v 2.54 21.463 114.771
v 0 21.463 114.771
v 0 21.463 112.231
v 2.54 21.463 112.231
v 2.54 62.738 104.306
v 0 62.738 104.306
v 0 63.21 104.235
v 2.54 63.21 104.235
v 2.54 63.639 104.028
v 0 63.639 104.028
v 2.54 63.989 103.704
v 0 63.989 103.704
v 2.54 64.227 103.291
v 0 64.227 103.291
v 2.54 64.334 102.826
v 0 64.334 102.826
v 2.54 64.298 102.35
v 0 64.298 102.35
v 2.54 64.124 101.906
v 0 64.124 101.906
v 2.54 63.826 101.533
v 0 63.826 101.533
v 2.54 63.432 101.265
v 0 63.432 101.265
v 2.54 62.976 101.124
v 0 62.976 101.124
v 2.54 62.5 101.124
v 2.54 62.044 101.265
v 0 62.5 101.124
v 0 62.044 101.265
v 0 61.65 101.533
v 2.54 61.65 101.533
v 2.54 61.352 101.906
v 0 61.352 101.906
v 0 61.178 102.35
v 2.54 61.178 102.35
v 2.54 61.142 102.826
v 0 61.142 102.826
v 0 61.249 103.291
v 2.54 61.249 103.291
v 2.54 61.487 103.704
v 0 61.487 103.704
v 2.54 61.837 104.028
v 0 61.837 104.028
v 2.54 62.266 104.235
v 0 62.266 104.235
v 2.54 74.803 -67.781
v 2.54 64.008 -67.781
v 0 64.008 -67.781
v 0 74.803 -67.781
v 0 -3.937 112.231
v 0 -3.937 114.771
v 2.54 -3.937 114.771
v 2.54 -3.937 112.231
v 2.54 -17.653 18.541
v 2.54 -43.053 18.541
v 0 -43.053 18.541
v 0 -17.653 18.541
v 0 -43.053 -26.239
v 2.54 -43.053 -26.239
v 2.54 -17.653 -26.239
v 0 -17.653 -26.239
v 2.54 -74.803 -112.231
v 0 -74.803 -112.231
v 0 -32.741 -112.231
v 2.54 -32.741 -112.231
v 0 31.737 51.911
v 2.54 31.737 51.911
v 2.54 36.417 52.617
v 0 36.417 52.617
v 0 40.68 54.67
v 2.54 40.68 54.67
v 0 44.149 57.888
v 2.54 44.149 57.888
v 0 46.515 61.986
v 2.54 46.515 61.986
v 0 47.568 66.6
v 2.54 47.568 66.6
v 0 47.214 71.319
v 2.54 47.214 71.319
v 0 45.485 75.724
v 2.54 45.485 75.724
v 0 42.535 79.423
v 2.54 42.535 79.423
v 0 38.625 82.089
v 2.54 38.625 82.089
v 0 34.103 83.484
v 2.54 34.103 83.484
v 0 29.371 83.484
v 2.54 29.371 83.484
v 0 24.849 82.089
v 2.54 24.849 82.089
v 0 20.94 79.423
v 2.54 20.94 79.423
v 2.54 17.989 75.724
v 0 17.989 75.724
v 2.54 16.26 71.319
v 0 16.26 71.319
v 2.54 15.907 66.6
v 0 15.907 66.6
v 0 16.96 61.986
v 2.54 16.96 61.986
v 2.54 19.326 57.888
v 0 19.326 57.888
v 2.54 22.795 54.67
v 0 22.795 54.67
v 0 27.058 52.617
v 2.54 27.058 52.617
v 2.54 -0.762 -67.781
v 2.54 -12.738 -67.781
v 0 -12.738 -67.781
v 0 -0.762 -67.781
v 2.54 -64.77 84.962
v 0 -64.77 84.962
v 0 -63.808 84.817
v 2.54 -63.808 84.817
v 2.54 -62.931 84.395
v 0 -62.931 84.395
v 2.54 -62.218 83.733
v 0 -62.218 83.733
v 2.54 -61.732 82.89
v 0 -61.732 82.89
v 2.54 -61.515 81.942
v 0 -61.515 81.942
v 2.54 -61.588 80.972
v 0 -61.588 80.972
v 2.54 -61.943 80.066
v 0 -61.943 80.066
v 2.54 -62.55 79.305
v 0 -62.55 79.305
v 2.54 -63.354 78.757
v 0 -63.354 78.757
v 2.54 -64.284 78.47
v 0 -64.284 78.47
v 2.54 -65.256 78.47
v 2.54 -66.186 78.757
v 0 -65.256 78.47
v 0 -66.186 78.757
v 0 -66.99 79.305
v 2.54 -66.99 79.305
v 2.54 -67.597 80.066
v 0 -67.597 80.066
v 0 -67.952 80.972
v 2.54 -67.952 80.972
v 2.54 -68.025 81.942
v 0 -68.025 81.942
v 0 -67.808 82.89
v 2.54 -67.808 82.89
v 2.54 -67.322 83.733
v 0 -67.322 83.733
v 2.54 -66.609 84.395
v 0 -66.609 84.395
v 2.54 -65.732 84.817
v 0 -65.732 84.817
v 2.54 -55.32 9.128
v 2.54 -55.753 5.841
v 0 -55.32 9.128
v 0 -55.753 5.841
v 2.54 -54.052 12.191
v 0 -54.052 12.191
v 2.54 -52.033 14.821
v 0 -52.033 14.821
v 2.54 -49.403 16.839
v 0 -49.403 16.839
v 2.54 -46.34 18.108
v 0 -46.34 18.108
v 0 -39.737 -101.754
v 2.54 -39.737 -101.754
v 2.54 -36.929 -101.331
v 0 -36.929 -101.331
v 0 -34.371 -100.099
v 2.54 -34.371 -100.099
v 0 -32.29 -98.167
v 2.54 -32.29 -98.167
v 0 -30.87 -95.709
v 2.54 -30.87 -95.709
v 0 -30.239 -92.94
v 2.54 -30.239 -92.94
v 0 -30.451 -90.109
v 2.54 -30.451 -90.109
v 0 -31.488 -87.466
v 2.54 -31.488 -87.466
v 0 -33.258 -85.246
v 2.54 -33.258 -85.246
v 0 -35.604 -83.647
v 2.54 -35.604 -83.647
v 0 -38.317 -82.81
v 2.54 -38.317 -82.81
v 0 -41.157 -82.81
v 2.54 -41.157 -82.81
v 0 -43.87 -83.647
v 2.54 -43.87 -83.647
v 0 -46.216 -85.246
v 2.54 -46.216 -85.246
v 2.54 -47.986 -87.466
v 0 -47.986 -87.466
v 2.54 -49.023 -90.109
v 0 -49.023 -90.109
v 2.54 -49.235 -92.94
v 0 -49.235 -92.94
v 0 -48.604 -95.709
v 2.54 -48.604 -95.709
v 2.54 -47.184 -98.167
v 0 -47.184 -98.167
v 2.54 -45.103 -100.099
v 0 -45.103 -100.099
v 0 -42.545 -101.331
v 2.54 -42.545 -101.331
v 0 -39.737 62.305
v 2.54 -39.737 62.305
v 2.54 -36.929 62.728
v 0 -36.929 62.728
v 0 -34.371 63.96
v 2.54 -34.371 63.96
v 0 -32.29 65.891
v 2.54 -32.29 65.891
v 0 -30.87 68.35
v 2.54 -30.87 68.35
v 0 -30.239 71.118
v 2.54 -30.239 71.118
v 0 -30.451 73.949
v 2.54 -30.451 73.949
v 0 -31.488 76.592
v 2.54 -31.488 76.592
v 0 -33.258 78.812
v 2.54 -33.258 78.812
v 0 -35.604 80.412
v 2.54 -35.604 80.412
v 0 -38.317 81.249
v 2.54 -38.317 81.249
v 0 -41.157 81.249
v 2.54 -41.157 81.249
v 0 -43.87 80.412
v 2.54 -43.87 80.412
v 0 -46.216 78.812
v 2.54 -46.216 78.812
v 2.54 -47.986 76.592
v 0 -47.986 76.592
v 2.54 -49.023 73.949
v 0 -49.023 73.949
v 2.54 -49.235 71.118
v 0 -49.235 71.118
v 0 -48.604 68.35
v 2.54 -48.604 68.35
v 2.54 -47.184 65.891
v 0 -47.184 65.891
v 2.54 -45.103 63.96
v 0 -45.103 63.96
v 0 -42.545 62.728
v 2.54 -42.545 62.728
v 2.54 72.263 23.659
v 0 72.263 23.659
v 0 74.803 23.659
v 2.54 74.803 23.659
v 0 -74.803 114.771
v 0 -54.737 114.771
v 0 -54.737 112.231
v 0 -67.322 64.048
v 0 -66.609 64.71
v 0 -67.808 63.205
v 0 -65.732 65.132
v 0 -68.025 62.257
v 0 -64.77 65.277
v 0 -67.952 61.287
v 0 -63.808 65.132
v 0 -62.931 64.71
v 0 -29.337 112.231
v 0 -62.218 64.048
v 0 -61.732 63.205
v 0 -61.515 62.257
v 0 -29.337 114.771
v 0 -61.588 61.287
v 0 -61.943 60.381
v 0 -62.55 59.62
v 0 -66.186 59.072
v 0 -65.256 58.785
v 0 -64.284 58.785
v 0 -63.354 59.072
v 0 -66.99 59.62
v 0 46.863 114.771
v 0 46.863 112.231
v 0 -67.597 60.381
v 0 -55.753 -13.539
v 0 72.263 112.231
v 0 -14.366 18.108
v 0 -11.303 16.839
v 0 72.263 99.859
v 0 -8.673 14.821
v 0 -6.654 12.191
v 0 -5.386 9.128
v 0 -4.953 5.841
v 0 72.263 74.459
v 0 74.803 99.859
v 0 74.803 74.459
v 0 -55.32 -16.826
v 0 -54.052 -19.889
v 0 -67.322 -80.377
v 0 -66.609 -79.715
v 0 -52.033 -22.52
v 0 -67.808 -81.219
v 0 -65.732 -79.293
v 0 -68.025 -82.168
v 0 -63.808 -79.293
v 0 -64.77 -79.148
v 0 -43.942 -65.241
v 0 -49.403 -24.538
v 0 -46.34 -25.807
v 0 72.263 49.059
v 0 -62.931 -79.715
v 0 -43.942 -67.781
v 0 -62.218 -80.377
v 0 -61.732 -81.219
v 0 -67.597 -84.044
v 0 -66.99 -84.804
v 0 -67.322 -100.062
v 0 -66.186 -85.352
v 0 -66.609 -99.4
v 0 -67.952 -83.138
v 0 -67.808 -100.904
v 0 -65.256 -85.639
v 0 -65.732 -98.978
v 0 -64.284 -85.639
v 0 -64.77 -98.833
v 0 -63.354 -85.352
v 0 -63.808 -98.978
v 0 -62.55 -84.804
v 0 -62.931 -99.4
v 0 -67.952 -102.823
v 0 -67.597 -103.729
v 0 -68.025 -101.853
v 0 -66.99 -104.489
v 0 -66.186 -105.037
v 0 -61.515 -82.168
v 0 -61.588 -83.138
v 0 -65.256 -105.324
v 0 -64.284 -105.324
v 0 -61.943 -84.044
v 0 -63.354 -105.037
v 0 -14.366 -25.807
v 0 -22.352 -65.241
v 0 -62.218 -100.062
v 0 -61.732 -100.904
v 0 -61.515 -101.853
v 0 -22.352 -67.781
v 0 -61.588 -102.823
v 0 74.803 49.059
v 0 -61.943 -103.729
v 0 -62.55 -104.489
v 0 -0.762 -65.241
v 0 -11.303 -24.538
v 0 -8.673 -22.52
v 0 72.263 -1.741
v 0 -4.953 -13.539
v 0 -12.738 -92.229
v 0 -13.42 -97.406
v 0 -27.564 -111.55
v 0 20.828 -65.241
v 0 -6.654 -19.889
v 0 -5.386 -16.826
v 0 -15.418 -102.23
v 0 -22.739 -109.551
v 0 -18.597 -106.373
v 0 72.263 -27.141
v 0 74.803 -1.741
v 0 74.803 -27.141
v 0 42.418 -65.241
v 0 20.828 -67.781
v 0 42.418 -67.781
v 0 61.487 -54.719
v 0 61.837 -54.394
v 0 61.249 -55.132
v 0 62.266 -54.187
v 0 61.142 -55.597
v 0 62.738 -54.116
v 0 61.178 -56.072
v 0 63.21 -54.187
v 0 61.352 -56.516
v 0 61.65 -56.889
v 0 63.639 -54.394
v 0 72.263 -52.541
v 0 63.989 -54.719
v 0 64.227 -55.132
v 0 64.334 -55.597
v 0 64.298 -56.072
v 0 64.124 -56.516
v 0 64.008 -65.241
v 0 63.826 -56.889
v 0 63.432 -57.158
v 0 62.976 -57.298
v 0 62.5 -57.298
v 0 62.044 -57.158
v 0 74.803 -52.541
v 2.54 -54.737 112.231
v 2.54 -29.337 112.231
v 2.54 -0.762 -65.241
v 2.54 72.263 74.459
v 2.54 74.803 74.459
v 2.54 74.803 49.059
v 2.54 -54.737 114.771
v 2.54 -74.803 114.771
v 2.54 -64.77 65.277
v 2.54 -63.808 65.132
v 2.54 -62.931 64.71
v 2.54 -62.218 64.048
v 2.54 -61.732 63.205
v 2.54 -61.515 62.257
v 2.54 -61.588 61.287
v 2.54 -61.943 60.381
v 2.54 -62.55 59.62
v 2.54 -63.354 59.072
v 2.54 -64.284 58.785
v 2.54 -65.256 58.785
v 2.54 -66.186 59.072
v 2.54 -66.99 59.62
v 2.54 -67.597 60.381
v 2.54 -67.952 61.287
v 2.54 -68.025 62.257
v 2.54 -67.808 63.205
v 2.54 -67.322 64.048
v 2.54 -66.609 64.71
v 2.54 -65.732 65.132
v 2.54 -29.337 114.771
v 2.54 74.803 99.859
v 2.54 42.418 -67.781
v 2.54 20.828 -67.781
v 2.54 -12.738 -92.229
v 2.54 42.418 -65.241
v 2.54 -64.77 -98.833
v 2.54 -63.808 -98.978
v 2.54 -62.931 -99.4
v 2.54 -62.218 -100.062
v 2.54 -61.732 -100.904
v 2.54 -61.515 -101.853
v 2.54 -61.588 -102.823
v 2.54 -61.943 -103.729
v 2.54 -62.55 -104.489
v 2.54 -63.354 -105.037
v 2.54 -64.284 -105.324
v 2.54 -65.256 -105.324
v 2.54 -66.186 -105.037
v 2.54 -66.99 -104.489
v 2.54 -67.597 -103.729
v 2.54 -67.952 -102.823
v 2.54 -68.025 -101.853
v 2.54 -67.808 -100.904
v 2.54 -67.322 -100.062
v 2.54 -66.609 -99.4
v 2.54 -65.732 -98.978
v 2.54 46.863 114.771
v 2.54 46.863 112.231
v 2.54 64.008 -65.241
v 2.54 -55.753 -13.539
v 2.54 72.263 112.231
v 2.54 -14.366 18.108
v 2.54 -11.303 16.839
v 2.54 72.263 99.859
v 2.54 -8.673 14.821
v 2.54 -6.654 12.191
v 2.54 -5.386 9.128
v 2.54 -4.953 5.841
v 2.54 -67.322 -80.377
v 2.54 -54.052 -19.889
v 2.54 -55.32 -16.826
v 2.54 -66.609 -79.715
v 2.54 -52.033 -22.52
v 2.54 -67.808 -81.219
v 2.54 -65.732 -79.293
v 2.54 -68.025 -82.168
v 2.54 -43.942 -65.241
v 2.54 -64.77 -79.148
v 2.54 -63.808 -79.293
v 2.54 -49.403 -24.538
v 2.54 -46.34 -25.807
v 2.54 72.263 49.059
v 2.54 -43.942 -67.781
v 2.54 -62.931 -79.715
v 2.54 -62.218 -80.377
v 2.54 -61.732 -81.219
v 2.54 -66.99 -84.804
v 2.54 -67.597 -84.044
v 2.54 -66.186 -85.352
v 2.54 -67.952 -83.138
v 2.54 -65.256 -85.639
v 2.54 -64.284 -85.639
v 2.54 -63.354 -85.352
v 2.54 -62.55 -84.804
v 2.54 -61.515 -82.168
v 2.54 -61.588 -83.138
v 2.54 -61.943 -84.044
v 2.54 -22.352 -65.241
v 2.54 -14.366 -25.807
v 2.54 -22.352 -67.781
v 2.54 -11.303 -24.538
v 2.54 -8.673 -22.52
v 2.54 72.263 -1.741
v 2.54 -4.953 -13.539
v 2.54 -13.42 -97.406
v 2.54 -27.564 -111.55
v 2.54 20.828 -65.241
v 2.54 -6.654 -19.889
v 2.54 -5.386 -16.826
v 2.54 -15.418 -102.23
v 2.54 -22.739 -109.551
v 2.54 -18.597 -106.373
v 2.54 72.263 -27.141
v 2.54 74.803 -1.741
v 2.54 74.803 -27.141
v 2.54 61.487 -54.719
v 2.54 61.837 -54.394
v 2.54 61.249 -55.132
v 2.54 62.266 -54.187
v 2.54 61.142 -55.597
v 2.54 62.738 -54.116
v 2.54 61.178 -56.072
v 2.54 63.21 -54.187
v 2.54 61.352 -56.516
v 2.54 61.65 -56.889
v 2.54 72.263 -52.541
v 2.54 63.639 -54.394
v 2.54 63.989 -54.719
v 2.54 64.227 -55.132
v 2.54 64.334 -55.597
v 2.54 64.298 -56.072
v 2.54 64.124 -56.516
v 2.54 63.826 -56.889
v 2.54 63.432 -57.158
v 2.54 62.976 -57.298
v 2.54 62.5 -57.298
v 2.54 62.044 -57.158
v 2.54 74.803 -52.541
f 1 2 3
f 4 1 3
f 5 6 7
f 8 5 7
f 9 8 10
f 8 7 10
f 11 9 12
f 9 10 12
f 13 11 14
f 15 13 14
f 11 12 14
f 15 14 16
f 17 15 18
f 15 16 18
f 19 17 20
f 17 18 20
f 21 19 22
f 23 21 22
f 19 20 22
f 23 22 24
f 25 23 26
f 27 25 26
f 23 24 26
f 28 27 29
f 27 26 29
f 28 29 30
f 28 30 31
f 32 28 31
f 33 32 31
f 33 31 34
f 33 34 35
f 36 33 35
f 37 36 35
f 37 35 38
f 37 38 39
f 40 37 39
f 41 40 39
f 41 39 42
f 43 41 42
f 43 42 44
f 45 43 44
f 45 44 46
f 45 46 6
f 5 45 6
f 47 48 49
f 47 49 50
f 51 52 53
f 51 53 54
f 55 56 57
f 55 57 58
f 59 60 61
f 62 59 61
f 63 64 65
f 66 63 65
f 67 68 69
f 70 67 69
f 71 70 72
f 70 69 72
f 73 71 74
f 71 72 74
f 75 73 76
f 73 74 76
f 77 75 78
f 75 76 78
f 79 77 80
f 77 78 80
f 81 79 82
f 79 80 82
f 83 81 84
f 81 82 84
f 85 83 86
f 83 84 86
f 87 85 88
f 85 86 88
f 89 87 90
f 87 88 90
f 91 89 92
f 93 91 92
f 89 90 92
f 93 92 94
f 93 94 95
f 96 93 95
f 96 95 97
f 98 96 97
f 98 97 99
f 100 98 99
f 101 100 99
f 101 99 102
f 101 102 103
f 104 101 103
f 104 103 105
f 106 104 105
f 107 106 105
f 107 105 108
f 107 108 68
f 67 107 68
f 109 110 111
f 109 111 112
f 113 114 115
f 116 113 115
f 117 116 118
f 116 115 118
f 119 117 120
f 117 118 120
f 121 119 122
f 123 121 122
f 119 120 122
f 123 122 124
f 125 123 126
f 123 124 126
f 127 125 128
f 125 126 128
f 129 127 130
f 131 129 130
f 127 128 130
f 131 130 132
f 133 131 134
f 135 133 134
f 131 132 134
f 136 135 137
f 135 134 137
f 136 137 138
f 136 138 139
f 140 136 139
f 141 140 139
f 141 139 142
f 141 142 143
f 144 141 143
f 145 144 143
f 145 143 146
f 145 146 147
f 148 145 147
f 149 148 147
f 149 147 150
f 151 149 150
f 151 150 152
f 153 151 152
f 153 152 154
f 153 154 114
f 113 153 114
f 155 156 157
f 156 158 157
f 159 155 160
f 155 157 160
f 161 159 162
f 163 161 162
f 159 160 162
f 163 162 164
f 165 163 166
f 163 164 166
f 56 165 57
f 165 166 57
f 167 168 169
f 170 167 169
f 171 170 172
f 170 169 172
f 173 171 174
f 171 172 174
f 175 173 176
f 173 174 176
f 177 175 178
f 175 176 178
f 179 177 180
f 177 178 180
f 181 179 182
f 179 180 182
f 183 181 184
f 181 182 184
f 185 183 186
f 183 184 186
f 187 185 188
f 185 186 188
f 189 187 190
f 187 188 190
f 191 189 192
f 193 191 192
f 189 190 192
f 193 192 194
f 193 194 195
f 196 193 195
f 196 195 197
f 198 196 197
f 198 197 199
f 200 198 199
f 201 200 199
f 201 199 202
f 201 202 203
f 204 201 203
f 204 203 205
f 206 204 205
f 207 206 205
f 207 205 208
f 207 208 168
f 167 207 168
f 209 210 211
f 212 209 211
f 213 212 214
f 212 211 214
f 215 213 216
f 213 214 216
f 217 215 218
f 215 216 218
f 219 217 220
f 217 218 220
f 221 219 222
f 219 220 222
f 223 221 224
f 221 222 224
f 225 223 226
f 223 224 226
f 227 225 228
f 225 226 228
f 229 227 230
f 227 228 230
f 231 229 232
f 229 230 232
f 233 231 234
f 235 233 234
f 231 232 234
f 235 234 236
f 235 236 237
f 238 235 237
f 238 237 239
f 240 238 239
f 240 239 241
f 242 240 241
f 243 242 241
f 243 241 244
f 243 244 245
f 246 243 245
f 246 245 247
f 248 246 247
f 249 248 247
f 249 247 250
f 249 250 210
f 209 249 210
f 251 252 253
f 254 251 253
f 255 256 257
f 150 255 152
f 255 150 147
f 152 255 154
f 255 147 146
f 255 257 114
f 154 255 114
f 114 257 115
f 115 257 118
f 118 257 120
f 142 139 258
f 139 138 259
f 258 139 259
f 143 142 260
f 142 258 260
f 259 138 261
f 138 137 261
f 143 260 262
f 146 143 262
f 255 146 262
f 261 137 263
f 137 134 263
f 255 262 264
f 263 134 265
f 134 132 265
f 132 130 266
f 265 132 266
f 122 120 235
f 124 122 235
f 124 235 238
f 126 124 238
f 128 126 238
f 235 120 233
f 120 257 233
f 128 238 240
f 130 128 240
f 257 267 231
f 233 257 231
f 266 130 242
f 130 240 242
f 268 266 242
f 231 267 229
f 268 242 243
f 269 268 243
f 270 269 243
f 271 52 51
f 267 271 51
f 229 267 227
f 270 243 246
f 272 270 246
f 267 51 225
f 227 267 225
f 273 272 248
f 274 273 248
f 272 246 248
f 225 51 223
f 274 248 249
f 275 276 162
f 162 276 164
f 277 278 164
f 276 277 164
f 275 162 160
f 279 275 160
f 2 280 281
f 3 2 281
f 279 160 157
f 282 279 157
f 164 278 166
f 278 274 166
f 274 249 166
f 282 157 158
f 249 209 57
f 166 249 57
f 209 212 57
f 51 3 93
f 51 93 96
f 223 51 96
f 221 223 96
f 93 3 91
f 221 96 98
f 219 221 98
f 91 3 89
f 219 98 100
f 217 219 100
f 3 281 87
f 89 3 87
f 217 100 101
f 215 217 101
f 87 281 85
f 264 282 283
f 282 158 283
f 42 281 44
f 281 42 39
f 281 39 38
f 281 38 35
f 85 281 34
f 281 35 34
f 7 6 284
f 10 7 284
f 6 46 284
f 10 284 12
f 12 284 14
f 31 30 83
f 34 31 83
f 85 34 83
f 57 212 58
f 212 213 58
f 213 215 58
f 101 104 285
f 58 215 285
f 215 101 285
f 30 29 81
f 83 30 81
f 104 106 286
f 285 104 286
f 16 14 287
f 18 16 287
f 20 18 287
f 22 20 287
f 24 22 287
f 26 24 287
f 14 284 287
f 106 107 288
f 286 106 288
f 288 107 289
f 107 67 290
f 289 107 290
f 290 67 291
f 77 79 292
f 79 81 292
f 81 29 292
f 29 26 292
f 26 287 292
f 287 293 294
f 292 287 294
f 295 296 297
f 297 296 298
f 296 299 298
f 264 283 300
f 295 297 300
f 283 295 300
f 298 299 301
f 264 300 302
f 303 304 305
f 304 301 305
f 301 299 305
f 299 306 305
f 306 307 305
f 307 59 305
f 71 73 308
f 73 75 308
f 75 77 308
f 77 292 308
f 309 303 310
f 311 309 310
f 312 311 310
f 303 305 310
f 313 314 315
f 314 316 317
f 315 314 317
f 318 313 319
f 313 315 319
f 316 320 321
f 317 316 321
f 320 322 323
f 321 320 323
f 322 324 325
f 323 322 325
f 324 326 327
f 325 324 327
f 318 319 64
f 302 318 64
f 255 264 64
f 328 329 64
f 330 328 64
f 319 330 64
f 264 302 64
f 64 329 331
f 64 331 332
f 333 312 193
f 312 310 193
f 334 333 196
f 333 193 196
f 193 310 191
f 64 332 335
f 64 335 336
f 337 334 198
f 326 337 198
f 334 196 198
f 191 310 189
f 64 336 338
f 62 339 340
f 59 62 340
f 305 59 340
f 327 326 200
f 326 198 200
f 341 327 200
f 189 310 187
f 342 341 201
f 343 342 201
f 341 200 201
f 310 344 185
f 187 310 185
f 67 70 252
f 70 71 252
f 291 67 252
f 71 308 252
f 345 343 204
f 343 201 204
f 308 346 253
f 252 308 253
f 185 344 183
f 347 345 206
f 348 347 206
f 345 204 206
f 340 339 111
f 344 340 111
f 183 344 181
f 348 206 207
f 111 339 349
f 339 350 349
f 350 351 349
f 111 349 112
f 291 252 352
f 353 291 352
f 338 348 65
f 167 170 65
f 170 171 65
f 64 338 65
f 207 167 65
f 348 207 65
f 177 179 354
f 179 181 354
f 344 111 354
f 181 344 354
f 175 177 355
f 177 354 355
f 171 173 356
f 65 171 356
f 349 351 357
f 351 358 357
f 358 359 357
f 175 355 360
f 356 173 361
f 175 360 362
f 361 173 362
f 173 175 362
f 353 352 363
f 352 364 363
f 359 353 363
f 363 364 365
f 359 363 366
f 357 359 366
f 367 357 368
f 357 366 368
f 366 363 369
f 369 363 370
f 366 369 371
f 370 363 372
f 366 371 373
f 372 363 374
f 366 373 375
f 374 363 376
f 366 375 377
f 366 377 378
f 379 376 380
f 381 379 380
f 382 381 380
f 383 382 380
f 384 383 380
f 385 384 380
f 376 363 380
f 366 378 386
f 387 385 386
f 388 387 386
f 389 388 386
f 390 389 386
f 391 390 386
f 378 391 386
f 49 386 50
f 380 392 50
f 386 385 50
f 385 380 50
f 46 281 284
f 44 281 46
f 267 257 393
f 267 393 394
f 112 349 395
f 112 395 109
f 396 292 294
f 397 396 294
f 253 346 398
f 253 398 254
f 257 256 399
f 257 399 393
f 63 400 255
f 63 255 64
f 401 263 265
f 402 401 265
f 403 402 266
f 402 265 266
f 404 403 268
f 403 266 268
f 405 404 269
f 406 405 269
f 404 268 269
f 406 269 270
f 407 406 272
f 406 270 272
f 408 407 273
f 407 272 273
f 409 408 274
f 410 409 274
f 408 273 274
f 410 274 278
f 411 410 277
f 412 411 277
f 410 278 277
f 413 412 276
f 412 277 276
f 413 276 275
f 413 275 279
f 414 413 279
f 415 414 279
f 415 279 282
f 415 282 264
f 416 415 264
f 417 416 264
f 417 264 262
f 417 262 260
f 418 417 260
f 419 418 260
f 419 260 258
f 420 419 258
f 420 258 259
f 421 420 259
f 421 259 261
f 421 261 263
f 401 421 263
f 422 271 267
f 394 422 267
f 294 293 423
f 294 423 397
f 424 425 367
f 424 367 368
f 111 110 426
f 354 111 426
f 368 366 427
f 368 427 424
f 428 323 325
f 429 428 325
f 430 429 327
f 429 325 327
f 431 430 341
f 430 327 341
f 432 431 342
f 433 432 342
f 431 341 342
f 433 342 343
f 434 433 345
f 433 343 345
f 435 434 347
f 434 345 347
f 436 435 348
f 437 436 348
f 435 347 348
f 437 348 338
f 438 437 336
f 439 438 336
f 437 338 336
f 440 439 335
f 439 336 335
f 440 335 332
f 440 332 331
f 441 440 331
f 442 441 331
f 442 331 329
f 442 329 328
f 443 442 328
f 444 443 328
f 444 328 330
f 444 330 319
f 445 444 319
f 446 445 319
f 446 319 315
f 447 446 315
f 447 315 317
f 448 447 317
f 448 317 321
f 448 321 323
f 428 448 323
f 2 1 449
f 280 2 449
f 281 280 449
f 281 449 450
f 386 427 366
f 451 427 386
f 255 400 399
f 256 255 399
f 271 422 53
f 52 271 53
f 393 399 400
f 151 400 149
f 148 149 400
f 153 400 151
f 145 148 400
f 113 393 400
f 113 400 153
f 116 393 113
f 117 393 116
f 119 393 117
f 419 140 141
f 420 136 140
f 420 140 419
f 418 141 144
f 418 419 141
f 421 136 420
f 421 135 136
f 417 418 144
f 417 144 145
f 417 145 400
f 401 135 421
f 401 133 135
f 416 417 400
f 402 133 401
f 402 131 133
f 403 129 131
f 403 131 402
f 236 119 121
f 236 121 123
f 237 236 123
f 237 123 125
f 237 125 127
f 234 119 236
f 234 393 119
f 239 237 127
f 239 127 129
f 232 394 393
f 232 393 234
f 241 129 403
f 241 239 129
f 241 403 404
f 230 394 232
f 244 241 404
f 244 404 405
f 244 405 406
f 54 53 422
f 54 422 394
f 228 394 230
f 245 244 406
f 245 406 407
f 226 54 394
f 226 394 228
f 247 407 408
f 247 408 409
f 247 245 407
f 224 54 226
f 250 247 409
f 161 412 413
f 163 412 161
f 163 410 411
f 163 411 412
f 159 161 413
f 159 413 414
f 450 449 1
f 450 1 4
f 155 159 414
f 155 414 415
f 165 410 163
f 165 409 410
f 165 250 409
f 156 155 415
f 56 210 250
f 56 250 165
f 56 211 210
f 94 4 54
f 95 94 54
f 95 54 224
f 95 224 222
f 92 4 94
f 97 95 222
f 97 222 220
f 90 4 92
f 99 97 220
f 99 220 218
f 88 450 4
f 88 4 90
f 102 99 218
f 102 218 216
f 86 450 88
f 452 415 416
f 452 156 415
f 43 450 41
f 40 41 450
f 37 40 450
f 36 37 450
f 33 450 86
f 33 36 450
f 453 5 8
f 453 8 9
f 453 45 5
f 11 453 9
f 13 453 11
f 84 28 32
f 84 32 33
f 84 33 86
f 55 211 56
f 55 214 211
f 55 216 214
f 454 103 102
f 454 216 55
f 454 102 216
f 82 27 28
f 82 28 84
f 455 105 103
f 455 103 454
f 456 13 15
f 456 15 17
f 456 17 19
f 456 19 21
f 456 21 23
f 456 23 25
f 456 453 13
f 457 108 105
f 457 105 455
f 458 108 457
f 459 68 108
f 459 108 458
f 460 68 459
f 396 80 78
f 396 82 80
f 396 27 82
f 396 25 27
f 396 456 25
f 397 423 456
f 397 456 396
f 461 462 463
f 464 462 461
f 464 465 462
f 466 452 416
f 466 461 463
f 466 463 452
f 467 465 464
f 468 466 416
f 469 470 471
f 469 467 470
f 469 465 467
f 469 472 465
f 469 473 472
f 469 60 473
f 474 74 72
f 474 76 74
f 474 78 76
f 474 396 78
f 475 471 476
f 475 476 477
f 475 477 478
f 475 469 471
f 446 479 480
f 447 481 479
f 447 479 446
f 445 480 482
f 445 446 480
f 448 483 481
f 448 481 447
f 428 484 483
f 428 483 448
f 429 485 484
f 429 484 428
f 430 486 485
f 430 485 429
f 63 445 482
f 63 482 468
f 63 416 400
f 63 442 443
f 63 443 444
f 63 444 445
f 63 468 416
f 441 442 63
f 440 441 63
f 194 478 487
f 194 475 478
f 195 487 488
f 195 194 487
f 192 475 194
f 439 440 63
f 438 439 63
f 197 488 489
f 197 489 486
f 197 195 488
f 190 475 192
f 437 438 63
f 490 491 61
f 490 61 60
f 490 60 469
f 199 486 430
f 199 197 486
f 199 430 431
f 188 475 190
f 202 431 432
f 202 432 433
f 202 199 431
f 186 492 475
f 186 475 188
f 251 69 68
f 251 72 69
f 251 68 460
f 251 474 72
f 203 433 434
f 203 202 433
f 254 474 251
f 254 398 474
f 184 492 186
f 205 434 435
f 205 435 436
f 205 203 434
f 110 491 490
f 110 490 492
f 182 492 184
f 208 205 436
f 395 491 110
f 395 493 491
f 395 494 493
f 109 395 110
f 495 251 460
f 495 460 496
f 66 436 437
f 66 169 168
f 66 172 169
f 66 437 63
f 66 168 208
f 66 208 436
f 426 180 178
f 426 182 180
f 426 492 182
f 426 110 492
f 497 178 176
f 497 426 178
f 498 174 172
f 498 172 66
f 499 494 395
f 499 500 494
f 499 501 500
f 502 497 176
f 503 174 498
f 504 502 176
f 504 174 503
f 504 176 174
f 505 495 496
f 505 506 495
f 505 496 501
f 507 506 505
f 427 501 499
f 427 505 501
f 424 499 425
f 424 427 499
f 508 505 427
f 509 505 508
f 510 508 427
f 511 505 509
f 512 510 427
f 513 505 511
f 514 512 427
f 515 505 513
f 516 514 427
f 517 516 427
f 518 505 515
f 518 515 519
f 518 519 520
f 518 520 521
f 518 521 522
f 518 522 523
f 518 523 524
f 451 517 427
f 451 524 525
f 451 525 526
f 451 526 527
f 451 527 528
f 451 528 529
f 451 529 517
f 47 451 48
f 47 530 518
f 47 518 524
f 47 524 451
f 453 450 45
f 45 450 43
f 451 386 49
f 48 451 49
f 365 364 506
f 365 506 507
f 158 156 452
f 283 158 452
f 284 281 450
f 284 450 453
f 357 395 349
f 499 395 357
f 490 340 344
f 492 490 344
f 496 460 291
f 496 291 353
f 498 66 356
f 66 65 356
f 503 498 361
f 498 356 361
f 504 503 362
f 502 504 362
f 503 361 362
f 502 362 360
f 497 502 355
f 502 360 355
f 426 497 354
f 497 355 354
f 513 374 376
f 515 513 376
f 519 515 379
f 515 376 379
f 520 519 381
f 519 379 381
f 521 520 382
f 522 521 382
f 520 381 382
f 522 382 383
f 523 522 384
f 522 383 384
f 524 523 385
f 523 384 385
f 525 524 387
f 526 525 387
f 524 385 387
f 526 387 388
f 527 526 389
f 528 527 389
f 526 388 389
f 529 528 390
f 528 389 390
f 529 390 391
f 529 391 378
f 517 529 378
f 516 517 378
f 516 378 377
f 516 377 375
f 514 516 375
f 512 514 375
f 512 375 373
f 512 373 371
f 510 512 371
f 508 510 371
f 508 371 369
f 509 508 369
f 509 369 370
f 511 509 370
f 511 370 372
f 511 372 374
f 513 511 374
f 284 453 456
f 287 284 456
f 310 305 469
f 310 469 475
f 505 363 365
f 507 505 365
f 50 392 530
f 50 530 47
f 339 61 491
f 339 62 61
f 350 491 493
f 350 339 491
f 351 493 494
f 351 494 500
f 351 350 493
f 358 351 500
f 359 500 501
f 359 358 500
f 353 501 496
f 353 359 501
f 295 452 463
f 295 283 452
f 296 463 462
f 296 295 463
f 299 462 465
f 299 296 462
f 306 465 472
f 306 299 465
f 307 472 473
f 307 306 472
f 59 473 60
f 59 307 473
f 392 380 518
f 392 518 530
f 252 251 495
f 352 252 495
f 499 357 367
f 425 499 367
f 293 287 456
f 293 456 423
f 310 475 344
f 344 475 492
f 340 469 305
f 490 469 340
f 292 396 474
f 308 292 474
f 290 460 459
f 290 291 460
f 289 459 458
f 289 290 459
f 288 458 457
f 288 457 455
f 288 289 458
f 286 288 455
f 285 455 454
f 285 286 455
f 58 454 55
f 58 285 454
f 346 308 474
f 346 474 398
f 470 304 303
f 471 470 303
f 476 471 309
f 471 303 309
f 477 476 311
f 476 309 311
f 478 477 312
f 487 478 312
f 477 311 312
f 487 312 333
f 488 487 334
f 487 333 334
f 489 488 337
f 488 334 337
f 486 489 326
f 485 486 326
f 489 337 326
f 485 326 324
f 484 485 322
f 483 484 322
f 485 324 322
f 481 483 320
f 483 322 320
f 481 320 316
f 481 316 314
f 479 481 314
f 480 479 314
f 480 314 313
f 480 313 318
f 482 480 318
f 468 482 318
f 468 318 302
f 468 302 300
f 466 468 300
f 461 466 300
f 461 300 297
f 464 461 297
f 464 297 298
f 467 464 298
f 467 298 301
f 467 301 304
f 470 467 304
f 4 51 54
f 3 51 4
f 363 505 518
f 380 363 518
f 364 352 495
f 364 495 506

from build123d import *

# Parameters (mm, degrees)
SKETCH1_W                   = 224.46234
SKETCH1_H                   = 149.606
BOSS_EXTRUDE1_DEPTH         = 2.54
SKETCH2_W                   = 44.45
SKETCH2_H                   = 87.5411
CUT_EXTRUDE1_DEPTH          = 135.899132423
FILLET1_R                   = 20.0025
F_1_4_CLEARANCE_HOLE1_D     = 6.5278
F_1_4_CLEARANCE_HOLE1_DEPTH = 9.398
F_1_4_CLEARANCE_HOLE1_TIP   = 1.961148974
SKETCH6_W                   = 25.4
SKETCH6_H                   = 2.54
CUT_EXTRUDE2_DEPTH          = 135.899132423
LPATTERN1_COUNT             = 4
LPATTERN1_PITCH             = 50.8
SKETCH7_W                   = 2.54
SKETCH7_H                   = 21.59
CUT_EXTRUDE3_DEPTH          = 135.899132423
LPATTERN2_COUNT             = 3
LPATTERN2_PITCH             = 43.18
SKETCH8_R                   = 9.525
CUT_EXTRUDE4_DEPTH          = 135.899132423
SKETCH9_R                   = 15.875
SKETCH9_W                   = 44.7802
SKETCH9_H                   = 50.8
CUT_EXTRUDE5_DEPTH          = 135.899132423
FILLET2_R                   = 12.7
M3_CLEARANCE_HOLE1_D        = 3.2
M3_CLEARANCE_HOLE1_DEPTH    = 9.398
M3_CLEARANCE_HOLE1_TIP      = 0.96137699
SKETCH16_W                  = 2.54
SKETCH16_H                  = 25.4
BOSS_EXTRUDE2_DEPTH         = 2.54
LPATTERN3_COUNT             = 3
LPATTERN3_PITCH             = 50.8
SKETCH18_W                  = 2.54
SKETCH18_H                  = 5.334
CUT_EXTRUDE7_DEPTH          = 141.002899371


with BuildPart() as part:
    # Sketch1 → Boss-Extrude1 (new body)
    with BuildSketch(Plane(origin=(0, 0, 0), x_dir=(0, 0, -1), z_dir=(1, 0, 0))):
        Rectangle(SKETCH1_W, SKETCH1_H)
    extrude(amount=BOSS_EXTRUDE1_DEPTH)

    # Sketch2 → Cut-Extrude1 (cut, through all)
    with BuildSketch(Plane(origin=(2.54, 0, 0), x_dir=(0, 0, -1), z_dir=(1, 0, 0))):
        with Locations((90.00617, 31.03245)):
            Rectangle(SKETCH2_W, SKETCH2_H)
    extrude(amount=-CUT_EXTRUDE1_DEPTH, mode=Mode.SUBTRACT)

    # Fillet1
    fillet1_edges = [part.edges().sort_by_distance(p)[0] for p in [
        (1.27, -12.7381, -112.23117),
    ]]
    fillet(fillet1_edges, radius=FILLET1_R)

    # 1/4 Clearance Hole1
    with Locations(Plane(origin=(2.54, 0, 0), x_dir=(0, 0, -1), z_dir=(1, 0, 0))):
        with Locations((-81.69783, -64.77), (-62.01283, -64.77), (102.09657, -64.77), (82.41157, -64.77)):
            Hole(F_1_4_CLEARANCE_HOLE1_D / 2, depth=F_1_4_CLEARANCE_HOLE1_DEPTH)
            with Locations((0, 0, -(F_1_4_CLEARANCE_HOLE1_DEPTH + F_1_4_CLEARANCE_HOLE1_TIP / 2))):  # 118° drill point
                Cone(0, F_1_4_CLEARANCE_HOLE1_D / 2, F_1_4_CLEARANCE_HOLE1_TIP, mode=Mode.SUBTRACT)

    # Sketch6 → Cut-Extrude2 (cut, through all)
    with BuildSketch(Plane(origin=(2.54, 0, 0), x_dir=(0, 0, -1), z_dir=(1, 0, 0))):
        with Locations((39.84117, 73.533)):
            Rectangle(SKETCH6_W, SKETCH6_H)
    cut_extrude2 = extrude(amount=-CUT_EXTRUDE2_DEPTH, mode=Mode.SUBTRACT)

    # LPattern1: Cut-Extrude2 ×4
    with Locations(*[(0, 0, i * LPATTERN1_PITCH) for i in range(1, LPATTERN1_COUNT)]):
        add(cut_extrude2, mode=Mode.SUBTRACT)

    # Sketch7 → Cut-Extrude3 (cut, through all)
    with BuildSketch(Plane(origin=(2.54, 0, 0), x_dir=(0, 0, -1), z_dir=(1, 0, 0))):
        with Locations((66.51117, 53.213)):
            Rectangle(SKETCH7_W, SKETCH7_H)
    cut_extrude3 = extrude(amount=-CUT_EXTRUDE3_DEPTH, mode=Mode.SUBTRACT)

    # LPattern2: Cut-Extrude3 ×3
    with Locations(*[(0, -i * LPATTERN2_PITCH, 0) for i in range(1, LPATTERN2_COUNT)]):
        add(cut_extrude3, mode=Mode.SUBTRACT)

    # Sketch8 → Cut-Extrude4 (cut, through all)
    with BuildSketch(Plane(origin=(2.54, 0, 0), x_dir=(0, 0, -1), z_dir=(1, 0, 0))):
        with Locations((92.22867, -39.7370046)):
            Circle(SKETCH8_R)
        with Locations((-71.82993, -39.7370046)):
            Circle(SKETCH8_R)
    extrude(amount=-CUT_EXTRUDE4_DEPTH, mode=Mode.SUBTRACT)

    # Sketch9 → Cut-Extrude5 (cut, through all)
    with BuildSketch(Plane(origin=(2.54, 0, 0), x_dir=(0, 0, -1), z_dir=(1, 0, 0))):
        with Locations((-67.78625, 31.7373)):
            Circle(SKETCH9_R)
        with Locations((3.84937, -30.353)):
            Rectangle(SKETCH9_W, SKETCH9_H)
    extrude(amount=-CUT_EXTRUDE5_DEPTH, mode=Mode.SUBTRACT)

    # Fillet2
    fillet2_edges = [part.edges().sort_by_distance(p)[0] for p in [
        (1.27, -55.753, 18.54073),
        (1.27, -4.953, 18.54073),
        (1.27, -4.953, -26.23947),
        (1.27, -55.753, -26.23947),
    ]]
    fillet(fillet2_edges, radius=FILLET2_R)

    # M3 Clearance Hole1
    with Locations(Plane(origin=(2.54, 0, 0), x_dir=(0, 0, -1), z_dir=(1, 0, 0))):
        with Locations((-102.70617, 62.738), (55.71617, 62.738)):
            Hole(M3_CLEARANCE_HOLE1_D / 2, depth=M3_CLEARANCE_HOLE1_DEPTH)
            with Locations((0, 0, -(M3_CLEARANCE_HOLE1_DEPTH + M3_CLEARANCE_HOLE1_TIP / 2))):  # 118° drill point
                Cone(0, M3_CLEARANCE_HOLE1_D / 2, M3_CLEARANCE_HOLE1_TIP, mode=Mode.SUBTRACT)

    # Sketch16 → Boss-Extrude2 (add)
    with BuildSketch(Plane(origin=(2.54, 0, 0), x_dir=(0, 0, -1), z_dir=(1, 0, 0))):
        with Locations((-113.50117, 34.163)):
            Rectangle(SKETCH16_W, SKETCH16_H)
    boss_extrude2 = extrude(amount=-BOSS_EXTRUDE2_DEPTH)

    # LPattern3: Boss-Extrude2 ×3
    with Locations(*[(0, -i * LPATTERN3_PITCH, 0) for i in range(1, LPATTERN3_COUNT)]):
        add(boss_extrude2)

    # Sketch18 → Cut-Extrude7 (cut, through all)
    with BuildSketch(Plane(origin=(2.54, 0, 0), x_dir=(0, 0, -1), z_dir=(1, 0, 0))):
        with Locations((-113.50117, -77.47)):
            Rectangle(SKETCH18_W, SKETCH18_H)
    extrude(amount=-CUT_EXTRUDE7_DEPTH, mode=Mode.SUBTRACT)


solid = part.part
